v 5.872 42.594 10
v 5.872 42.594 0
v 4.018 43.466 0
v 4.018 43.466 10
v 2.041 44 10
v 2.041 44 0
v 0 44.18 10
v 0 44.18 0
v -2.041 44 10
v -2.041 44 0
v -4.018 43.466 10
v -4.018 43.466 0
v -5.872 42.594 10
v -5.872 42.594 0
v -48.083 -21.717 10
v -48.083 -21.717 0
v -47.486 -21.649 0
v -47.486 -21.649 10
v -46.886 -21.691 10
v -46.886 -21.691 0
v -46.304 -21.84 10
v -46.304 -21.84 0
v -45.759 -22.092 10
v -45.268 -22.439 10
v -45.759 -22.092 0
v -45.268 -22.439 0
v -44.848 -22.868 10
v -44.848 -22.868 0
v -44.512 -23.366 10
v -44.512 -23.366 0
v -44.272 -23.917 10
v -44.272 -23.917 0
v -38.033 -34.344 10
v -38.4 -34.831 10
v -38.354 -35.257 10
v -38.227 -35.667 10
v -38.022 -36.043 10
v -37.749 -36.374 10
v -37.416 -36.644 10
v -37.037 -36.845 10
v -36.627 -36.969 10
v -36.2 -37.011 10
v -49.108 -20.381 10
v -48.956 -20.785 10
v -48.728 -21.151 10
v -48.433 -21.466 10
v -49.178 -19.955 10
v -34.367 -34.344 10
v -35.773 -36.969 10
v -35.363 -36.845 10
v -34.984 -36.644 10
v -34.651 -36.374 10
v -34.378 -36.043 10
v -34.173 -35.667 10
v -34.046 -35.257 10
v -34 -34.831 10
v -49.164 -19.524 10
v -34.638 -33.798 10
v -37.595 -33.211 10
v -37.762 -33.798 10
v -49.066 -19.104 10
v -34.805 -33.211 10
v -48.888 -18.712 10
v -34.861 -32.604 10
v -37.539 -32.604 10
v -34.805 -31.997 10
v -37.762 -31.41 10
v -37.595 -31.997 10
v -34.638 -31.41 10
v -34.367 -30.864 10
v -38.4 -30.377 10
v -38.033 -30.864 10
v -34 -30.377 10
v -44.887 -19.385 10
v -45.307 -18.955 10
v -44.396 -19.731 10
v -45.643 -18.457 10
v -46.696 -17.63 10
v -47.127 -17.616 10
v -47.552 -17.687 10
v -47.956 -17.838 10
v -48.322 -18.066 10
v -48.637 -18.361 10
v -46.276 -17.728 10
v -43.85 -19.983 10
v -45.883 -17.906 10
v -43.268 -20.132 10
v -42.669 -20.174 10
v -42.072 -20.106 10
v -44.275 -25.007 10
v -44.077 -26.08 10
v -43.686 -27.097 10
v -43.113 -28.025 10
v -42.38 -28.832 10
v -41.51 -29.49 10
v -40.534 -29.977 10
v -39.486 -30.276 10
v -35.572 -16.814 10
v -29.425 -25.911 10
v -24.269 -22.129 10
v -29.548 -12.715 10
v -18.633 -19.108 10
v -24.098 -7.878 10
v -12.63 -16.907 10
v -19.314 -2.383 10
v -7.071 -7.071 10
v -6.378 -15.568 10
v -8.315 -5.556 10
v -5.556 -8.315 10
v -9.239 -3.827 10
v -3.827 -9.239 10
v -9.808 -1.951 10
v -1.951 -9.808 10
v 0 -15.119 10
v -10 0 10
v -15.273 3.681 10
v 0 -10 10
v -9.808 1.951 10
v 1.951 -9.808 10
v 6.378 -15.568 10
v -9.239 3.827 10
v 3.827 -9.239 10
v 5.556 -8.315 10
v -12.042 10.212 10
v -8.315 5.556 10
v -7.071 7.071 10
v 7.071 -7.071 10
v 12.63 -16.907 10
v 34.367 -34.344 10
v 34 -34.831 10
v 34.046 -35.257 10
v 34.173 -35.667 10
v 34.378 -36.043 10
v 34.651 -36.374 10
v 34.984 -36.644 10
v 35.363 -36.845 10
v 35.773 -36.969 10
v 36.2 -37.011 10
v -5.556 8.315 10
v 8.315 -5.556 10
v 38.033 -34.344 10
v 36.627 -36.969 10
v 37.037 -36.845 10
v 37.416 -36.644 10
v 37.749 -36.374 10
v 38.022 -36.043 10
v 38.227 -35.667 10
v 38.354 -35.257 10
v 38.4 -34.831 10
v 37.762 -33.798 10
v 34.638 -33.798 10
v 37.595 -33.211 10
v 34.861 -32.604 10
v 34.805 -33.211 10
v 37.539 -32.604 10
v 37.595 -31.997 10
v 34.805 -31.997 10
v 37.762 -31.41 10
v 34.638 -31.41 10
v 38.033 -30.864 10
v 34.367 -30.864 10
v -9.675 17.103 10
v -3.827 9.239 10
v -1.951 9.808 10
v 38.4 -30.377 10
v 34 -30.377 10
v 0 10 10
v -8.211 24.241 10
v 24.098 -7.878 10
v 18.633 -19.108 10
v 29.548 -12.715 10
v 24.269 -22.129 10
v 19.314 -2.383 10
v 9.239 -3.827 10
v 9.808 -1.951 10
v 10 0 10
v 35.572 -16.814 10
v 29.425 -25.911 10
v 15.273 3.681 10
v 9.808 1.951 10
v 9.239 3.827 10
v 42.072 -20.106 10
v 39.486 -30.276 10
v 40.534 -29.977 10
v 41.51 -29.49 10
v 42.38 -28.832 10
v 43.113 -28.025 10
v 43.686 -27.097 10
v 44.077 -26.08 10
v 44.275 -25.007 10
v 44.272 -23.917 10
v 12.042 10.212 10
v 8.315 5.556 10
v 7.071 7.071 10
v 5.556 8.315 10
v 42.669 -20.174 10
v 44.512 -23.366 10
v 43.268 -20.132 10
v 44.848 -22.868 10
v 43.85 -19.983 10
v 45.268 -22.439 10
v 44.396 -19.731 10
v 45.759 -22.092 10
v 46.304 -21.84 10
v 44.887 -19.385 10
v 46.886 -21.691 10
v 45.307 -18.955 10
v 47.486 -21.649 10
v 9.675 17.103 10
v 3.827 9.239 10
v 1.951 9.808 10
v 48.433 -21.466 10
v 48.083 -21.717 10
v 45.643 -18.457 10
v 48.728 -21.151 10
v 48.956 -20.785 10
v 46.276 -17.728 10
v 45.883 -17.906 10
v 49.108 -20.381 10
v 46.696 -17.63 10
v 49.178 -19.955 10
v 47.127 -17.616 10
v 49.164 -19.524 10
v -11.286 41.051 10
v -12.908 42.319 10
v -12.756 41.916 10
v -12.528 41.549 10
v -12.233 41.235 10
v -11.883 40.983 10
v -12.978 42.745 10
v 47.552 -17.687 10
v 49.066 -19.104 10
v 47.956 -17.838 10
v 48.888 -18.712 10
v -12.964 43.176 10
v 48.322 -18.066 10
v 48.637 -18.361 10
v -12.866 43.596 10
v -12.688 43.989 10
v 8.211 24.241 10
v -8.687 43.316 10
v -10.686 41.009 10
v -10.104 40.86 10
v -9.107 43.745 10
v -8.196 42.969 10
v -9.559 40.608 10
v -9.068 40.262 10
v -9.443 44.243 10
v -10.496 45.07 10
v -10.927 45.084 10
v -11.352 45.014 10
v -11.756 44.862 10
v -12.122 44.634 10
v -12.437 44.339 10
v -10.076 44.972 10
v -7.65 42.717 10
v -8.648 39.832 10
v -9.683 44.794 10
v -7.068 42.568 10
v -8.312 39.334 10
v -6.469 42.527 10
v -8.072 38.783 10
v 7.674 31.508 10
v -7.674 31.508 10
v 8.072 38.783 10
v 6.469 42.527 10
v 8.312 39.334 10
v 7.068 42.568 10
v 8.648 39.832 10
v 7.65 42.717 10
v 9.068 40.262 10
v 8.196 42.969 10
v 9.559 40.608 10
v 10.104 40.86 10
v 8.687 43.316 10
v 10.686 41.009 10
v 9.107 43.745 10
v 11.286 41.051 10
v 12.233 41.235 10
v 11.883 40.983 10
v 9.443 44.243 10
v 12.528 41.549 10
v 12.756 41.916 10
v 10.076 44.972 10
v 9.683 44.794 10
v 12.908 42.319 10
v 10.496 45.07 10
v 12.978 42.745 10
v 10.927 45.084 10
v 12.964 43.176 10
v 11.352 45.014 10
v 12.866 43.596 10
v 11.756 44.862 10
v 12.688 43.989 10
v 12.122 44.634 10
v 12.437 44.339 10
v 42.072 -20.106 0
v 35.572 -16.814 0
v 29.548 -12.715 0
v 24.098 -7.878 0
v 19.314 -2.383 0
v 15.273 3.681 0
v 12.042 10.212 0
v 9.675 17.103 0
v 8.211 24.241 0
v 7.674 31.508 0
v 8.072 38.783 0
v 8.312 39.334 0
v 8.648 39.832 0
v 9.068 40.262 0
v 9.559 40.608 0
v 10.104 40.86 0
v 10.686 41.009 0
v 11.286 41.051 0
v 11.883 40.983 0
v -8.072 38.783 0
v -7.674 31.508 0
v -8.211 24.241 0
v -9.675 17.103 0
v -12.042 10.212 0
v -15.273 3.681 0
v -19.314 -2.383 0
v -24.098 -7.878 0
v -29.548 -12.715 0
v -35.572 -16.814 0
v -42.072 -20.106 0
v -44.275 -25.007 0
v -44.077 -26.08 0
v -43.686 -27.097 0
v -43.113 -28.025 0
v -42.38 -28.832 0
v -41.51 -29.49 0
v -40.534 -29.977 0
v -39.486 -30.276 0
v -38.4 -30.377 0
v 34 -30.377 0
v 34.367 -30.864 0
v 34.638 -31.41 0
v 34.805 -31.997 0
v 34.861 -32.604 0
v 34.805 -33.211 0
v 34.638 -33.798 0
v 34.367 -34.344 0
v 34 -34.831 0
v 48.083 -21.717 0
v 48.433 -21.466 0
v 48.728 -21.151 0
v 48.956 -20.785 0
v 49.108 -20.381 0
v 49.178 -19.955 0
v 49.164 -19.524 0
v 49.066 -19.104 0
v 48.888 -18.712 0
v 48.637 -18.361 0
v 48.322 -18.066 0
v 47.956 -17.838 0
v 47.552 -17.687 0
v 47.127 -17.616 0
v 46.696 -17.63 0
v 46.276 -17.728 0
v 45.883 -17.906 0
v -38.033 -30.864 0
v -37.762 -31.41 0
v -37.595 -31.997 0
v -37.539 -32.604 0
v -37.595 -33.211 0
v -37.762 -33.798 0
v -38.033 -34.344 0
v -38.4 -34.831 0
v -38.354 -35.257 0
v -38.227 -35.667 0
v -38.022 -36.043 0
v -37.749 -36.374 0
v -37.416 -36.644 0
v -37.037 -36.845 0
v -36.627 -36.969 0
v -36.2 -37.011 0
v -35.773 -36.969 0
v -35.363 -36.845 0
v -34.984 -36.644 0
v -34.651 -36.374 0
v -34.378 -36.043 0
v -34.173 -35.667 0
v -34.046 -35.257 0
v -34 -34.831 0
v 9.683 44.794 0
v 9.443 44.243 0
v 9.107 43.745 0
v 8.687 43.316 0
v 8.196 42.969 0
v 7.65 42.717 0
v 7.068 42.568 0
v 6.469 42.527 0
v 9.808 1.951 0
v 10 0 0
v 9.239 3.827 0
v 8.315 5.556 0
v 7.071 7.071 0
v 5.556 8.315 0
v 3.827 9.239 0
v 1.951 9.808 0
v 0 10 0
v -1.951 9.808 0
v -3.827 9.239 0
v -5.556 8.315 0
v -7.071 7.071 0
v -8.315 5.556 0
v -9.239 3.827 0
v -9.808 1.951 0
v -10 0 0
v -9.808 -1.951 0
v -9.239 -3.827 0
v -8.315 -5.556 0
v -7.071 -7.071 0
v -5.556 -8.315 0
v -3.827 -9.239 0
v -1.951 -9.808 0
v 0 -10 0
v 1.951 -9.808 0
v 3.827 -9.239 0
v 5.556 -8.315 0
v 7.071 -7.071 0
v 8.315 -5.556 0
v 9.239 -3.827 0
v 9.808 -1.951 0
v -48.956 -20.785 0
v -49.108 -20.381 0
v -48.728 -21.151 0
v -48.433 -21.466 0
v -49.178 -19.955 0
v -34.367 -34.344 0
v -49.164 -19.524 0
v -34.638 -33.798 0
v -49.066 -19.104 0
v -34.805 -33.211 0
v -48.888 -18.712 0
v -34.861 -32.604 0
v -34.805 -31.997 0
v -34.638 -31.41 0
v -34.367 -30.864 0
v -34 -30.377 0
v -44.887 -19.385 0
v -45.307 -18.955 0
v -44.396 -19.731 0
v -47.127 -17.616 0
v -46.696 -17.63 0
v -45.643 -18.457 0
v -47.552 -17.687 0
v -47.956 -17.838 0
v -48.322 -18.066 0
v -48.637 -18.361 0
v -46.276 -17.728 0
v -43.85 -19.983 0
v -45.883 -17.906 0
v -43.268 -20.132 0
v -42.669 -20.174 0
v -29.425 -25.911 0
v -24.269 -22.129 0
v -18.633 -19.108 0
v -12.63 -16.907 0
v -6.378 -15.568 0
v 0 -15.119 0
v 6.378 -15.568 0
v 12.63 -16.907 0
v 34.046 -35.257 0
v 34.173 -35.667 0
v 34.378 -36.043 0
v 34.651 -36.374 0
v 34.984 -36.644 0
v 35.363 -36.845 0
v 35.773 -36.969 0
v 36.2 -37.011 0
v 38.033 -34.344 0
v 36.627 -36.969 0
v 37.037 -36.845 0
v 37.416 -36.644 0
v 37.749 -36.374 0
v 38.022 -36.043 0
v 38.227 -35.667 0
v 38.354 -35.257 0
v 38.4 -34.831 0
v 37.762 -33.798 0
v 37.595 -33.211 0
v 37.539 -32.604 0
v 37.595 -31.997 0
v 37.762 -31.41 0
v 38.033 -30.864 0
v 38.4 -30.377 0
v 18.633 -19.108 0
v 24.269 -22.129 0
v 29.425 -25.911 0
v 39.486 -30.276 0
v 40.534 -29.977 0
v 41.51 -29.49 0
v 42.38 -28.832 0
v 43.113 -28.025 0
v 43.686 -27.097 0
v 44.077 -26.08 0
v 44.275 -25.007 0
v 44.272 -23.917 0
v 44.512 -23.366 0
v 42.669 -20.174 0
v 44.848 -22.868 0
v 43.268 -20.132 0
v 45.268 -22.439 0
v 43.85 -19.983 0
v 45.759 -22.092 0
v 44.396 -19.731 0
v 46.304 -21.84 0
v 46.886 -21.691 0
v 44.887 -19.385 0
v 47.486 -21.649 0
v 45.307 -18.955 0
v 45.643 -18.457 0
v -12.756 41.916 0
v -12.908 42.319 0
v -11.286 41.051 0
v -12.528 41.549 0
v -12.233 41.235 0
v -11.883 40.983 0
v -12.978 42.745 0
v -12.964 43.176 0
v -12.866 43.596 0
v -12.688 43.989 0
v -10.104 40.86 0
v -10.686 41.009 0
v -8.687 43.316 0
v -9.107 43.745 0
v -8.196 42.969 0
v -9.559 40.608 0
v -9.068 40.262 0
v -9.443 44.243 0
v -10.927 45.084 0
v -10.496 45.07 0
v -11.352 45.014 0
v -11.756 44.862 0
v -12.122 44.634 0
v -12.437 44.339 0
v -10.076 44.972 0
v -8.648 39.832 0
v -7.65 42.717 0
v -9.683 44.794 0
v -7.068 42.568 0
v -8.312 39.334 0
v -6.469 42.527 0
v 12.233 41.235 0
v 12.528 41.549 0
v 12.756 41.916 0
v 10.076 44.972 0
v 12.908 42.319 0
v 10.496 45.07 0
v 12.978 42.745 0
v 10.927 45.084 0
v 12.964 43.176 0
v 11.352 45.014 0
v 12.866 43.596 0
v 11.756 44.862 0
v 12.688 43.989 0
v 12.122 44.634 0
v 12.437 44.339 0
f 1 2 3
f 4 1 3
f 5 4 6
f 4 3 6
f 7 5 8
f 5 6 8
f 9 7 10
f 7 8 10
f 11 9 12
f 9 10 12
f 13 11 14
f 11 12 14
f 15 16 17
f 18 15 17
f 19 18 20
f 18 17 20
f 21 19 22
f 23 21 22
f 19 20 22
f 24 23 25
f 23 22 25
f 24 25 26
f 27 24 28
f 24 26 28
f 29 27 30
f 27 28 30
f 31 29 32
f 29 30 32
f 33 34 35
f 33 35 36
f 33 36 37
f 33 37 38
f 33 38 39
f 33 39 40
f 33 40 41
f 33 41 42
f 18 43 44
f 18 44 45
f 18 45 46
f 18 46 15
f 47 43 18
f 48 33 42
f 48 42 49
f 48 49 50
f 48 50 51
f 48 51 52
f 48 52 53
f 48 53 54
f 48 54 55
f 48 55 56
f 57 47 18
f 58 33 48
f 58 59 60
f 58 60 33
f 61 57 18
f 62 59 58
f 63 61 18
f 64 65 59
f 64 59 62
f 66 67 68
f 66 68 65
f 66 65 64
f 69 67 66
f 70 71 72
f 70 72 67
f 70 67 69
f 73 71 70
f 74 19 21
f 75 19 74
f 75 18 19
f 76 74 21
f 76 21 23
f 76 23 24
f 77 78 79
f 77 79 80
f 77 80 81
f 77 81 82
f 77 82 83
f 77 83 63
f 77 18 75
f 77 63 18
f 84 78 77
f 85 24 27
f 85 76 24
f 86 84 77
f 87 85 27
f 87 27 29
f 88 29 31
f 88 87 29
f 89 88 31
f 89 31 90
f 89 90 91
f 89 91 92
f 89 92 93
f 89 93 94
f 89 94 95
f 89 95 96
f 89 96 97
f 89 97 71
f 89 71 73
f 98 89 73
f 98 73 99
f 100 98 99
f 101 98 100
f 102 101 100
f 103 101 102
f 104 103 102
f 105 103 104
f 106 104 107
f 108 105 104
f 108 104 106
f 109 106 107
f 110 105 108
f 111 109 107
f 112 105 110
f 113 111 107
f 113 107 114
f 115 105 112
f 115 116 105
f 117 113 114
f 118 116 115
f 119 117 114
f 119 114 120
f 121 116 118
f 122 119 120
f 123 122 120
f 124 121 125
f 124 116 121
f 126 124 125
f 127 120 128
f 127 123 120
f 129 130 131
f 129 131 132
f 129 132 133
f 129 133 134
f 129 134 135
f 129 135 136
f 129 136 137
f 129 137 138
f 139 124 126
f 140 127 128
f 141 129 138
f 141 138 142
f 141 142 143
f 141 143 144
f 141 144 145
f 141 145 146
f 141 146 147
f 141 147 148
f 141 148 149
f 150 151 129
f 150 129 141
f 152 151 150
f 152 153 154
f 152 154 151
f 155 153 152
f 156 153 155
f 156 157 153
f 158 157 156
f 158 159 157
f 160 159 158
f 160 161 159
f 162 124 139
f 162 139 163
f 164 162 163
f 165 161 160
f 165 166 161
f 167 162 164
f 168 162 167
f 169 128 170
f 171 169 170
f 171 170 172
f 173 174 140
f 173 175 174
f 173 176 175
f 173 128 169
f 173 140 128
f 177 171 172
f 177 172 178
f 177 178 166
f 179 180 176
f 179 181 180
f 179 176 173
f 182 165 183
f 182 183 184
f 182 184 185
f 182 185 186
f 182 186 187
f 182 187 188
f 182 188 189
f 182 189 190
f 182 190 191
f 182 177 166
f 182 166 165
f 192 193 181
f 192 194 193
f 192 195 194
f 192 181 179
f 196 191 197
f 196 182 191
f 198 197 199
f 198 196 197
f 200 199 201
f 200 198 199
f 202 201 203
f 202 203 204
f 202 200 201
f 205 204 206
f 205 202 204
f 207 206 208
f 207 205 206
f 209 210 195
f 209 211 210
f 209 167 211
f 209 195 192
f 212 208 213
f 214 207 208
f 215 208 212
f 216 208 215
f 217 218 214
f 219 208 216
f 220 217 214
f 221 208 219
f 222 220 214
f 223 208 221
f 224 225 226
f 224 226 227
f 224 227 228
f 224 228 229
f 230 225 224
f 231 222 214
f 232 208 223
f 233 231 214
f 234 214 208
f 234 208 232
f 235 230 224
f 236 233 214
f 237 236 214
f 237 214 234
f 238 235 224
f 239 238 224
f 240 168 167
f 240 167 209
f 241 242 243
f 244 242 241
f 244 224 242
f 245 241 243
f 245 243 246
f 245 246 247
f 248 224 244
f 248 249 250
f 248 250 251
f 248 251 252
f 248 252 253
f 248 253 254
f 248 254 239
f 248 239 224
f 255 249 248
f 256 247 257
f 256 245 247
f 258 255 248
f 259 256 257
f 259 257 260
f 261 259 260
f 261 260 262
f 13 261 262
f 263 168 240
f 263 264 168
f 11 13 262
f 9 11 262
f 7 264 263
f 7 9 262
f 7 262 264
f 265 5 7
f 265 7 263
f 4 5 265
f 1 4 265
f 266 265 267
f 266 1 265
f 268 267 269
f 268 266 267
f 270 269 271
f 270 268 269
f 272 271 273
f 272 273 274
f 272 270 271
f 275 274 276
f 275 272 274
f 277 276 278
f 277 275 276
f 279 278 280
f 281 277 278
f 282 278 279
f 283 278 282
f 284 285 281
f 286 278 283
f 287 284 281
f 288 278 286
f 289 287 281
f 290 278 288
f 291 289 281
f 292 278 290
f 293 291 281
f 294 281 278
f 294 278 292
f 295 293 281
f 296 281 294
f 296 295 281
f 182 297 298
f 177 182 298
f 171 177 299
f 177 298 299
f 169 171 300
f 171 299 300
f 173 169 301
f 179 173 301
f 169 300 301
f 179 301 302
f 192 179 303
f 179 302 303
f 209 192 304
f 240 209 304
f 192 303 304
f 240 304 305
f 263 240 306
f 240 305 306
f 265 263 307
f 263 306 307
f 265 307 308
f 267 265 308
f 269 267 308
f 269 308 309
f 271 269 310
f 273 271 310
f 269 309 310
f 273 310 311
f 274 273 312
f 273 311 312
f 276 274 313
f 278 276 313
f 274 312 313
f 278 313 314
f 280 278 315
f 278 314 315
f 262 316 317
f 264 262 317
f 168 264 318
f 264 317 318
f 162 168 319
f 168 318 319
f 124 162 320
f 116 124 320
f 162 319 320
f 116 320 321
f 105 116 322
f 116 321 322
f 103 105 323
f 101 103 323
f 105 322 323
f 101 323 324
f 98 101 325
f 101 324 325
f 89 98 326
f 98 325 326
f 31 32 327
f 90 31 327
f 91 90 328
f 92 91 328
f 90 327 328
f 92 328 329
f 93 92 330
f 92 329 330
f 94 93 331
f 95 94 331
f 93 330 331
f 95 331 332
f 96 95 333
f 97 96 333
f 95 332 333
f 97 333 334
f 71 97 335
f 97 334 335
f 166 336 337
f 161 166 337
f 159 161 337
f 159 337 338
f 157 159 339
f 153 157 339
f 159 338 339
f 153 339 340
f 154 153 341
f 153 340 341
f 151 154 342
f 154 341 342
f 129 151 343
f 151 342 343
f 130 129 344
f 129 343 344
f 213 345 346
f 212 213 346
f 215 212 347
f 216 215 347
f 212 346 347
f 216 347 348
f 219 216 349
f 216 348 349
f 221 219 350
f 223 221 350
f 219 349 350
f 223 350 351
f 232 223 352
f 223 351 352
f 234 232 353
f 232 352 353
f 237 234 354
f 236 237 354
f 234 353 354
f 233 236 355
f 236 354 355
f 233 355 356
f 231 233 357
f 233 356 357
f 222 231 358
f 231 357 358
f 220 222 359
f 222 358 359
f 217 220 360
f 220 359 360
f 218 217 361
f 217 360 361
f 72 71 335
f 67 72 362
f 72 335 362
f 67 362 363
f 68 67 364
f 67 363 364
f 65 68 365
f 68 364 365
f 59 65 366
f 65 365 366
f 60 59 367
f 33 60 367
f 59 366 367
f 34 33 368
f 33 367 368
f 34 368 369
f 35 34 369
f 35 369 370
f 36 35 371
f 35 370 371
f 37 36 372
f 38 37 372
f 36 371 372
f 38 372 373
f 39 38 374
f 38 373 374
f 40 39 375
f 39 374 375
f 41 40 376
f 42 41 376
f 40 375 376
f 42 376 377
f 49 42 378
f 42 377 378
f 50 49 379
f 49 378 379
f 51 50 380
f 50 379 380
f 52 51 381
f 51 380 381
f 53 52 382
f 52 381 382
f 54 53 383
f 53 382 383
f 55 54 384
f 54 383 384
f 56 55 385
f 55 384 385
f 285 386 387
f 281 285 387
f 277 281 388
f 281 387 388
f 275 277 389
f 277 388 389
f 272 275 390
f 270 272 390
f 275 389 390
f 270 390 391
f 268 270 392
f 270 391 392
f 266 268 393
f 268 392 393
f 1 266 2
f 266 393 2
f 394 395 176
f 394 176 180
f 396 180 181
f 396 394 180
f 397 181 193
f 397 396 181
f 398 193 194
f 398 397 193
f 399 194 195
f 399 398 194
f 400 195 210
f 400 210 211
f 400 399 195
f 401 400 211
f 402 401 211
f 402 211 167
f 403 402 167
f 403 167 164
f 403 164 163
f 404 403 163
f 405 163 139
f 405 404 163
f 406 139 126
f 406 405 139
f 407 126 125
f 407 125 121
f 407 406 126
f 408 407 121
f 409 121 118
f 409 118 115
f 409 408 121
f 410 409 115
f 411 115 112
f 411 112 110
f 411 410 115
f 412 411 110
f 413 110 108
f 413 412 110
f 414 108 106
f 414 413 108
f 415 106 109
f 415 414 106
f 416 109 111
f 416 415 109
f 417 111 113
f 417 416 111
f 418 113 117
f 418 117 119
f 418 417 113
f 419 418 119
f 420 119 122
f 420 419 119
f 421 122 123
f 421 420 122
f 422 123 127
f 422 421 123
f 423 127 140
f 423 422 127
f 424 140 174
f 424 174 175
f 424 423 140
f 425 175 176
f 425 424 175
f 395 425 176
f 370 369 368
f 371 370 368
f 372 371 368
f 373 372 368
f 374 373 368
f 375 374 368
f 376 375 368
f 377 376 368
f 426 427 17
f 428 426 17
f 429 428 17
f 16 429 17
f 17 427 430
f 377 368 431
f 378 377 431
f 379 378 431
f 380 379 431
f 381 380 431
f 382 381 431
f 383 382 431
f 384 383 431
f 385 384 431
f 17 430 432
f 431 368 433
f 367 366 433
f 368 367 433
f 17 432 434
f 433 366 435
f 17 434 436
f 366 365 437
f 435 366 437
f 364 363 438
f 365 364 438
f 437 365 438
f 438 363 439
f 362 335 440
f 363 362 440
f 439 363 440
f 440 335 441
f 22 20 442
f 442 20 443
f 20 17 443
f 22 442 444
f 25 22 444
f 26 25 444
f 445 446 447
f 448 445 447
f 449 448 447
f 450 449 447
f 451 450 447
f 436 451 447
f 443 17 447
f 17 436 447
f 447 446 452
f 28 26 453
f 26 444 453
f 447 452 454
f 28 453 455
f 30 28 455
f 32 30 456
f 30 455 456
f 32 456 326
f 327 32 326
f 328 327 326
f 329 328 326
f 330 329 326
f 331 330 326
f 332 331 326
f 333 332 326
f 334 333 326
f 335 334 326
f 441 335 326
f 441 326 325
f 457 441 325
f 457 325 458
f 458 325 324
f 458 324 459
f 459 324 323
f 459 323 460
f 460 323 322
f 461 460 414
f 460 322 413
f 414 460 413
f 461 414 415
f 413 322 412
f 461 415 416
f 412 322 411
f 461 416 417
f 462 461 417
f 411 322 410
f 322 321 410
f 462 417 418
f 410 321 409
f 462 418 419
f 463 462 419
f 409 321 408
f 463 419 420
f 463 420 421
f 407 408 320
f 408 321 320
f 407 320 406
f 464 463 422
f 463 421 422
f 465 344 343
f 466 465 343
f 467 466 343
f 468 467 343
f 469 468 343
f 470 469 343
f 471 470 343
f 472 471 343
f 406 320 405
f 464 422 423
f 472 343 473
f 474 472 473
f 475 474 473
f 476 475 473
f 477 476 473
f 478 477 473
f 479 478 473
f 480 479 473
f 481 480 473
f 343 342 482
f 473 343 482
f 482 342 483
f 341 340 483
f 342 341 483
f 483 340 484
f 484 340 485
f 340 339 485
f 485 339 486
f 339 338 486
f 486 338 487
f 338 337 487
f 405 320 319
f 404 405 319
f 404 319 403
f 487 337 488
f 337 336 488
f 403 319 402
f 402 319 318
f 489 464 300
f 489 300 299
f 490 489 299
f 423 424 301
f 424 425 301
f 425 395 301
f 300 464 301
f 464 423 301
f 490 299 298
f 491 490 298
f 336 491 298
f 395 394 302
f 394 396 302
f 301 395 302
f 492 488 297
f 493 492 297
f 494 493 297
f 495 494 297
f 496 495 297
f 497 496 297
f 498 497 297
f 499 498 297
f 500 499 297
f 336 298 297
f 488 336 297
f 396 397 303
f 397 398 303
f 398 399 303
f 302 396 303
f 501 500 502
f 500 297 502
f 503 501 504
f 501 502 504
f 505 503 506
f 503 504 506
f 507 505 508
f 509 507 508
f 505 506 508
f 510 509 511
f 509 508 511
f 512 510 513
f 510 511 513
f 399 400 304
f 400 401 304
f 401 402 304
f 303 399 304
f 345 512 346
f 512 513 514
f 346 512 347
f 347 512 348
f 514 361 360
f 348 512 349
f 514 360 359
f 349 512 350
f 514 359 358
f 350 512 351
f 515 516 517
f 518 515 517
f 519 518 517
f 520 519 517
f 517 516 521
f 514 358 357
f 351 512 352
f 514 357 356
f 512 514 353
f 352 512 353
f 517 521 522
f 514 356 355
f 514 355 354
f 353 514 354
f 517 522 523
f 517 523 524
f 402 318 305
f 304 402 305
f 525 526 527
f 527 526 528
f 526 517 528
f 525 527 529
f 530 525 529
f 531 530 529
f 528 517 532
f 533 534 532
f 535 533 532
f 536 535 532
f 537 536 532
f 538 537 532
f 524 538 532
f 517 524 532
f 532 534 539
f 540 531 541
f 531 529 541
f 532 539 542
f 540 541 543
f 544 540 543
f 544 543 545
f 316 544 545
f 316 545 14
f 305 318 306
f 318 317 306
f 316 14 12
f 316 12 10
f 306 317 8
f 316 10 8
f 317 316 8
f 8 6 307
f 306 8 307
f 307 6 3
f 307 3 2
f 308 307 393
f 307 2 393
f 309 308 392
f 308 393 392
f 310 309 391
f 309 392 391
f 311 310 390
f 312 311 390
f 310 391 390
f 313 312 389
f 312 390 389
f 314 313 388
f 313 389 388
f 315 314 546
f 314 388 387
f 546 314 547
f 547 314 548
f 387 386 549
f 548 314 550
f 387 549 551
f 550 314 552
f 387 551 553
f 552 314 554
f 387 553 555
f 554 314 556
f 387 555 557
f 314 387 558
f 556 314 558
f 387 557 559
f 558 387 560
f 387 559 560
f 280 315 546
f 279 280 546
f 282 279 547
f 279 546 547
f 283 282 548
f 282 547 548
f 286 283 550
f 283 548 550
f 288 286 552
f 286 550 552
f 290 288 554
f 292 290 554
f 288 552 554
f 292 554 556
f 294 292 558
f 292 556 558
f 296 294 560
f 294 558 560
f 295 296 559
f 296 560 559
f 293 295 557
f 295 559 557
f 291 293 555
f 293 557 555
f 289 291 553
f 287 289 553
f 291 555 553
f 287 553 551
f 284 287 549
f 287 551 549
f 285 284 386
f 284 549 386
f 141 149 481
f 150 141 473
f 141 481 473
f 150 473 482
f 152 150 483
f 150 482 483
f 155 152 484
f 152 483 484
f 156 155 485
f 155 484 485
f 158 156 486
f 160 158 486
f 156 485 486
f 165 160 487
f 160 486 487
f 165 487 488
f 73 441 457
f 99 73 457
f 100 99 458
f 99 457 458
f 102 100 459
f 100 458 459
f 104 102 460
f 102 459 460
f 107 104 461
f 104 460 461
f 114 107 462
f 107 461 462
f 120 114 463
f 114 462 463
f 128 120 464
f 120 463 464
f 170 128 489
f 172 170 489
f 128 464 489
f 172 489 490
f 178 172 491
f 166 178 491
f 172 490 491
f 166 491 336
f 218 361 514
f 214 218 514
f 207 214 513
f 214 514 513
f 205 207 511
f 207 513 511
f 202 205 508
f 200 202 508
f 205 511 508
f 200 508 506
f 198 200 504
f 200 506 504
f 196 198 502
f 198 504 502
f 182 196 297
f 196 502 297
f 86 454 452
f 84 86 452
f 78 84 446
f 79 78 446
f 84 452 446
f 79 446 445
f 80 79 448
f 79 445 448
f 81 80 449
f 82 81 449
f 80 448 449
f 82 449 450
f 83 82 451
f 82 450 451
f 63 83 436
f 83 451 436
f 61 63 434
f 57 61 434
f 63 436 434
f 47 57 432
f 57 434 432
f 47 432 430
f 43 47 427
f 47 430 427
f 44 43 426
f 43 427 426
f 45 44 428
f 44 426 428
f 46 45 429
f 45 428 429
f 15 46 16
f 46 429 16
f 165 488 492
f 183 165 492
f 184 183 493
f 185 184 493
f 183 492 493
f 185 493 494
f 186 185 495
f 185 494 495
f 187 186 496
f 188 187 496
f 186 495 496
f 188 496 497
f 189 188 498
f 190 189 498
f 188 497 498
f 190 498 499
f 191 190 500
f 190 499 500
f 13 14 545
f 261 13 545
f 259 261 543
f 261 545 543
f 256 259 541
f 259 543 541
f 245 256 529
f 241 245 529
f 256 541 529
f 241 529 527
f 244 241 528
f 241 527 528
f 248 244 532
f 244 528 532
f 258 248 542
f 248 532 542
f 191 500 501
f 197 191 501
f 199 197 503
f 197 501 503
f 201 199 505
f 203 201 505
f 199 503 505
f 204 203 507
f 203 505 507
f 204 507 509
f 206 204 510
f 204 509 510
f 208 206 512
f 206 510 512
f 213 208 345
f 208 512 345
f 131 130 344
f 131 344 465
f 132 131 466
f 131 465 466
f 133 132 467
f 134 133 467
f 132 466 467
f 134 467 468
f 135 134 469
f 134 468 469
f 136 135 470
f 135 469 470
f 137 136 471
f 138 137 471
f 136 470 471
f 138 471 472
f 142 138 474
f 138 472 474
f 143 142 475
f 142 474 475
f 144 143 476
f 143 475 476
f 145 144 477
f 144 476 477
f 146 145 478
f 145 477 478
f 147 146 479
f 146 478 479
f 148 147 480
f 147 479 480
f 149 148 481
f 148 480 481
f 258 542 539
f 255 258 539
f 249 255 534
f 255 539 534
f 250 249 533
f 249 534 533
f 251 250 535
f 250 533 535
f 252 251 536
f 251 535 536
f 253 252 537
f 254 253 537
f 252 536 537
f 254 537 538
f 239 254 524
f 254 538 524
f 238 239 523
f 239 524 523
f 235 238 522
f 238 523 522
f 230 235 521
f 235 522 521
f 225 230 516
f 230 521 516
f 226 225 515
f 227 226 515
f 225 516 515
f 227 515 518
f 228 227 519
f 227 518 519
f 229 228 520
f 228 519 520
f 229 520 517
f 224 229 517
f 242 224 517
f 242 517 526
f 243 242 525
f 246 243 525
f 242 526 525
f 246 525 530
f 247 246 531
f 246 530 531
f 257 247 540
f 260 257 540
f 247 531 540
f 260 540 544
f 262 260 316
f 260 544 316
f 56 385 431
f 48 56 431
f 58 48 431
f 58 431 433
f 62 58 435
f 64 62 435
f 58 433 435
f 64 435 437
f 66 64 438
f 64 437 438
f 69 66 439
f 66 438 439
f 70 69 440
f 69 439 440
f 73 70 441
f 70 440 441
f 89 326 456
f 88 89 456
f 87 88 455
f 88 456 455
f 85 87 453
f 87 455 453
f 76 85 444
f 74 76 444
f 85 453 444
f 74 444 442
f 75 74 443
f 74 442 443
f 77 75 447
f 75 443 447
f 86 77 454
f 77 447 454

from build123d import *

# Parameters (mm, degrees)
F0_R     = 15
F0_R_2   = 10
F1_DEPTH = 10


# Not quite as in the source:
# - a feature names something its author has since deleted; it is built from what else it names


with BuildPart() as f1:
    # F0 (on Top) → F1 (new body)
    with BuildSketch(Plane.XY):
        with BuildLine():
            ThreePointArc((42.0721931458, -20.106328072), (15.2726376348, 3.6807596445), (8.0721931458, 38.7833993854))
            ThreePointArc((8.0721931458, 38.7833993854), (9.5591074328, 40.6079882936), (11.8827049224, 40.9833993854))
            ThreePointArc((11.8827049224, 40.9833993854), (12.6879608107, 43.9886552737), (9.6827049224, 44.793911162))
            ThreePointArc((9.6827049224, 44.793911162), (8.1957906353, 42.9693222537), (5.8721931458, 42.593911162))
            ThreePointArc((5.8721931458, 42.593911162), (0, 44.17956576), (-5.8721931458, 42.593911162))
            ThreePointArc((-5.8721931458, 42.593911162), (-8.1957906353, 42.9693222537), (-9.6827049224, 44.793911162))
            ThreePointArc((-9.6827049224, 44.793911162), (-12.6879608107, 43.9886552737), (-11.8827049224, 40.9833993854))
            ThreePointArc((-11.8827049224, 40.9833993854), (-9.5591074328, 40.6079882936), (-8.0721931458, 38.7833993854))
            ThreePointArc((-8.0721931458, 38.7833993854), (-15.2726376348, 3.6807596445), (-42.0721931458, -20.106328072))
            ThreePointArc((-42.0721931458, -20.106328072), (-44.3957906353, -19.7309169803), (-45.8827049224, -17.906328072))
            ThreePointArc((-45.8827049224, -17.906328072), (-48.8879608107, -18.7115839603), (-48.0827049224, -21.7168398486))
            ThreePointArc((-48.0827049224, -21.7168398486), (-45.7591074328, -22.0922509404), (-44.2721931458, -23.9168398486))
            ThreePointArc((-44.2721931458, -23.9168398486), (-42.7651143596, -28.4458898793), (-38.4, -30.3770442686))
            ThreePointArc((-38.4, -30.3770442686), (-37.5391516656, -32.6039224965), (-38.4, -34.8308007245))
            ThreePointArc((-38.4, -34.8308007245), (-36.2, -37.010864664), (-34, -34.8308007245))
            ThreePointArc((-34, -34.8308007245), (-34.8608483344, -32.6039224965), (-34, -30.3770442686))
            ThreePointArc((-34, -30.3770442686), (0, -15.1188267986), (34, -30.3770442686))
            ThreePointArc((34, -30.3770442686), (34.8608483344, -32.6039224965), (34, -34.8308007245))
            ThreePointArc((34, -34.8308007245), (36.2, -37.010864664), (38.4, -34.8308007245))
            ThreePointArc((38.4, -34.8308007245), (37.5391516656, -32.6039224965), (38.4, -30.3770442686))
            ThreePointArc((38.4, -30.3770442686), (42.7651143596, -28.4458898793), (44.2721931458, -23.9168398486))
            ThreePointArc((44.2721931458, -23.9168398486), (45.7591074328, -22.0922509404), (48.0827049224, -21.7168398486))
            ThreePointArc((48.0827049224, -21.7168398486), (48.8879608107, -18.7115839603), (45.8827049224, -17.906328072))
            ThreePointArc((45.8827049224, -17.906328072), (44.3957906353, -19.7309169803), (42.0721931458, -20.106328072))
        make_face()
        Circle(F0_R, mode=Mode.SUBTRACT)
        Circle(F0_R)
        Circle(F0_R_2, mode=Mode.SUBTRACT)
    extrude(amount=F1_DEPTH)


solid = f1.part
